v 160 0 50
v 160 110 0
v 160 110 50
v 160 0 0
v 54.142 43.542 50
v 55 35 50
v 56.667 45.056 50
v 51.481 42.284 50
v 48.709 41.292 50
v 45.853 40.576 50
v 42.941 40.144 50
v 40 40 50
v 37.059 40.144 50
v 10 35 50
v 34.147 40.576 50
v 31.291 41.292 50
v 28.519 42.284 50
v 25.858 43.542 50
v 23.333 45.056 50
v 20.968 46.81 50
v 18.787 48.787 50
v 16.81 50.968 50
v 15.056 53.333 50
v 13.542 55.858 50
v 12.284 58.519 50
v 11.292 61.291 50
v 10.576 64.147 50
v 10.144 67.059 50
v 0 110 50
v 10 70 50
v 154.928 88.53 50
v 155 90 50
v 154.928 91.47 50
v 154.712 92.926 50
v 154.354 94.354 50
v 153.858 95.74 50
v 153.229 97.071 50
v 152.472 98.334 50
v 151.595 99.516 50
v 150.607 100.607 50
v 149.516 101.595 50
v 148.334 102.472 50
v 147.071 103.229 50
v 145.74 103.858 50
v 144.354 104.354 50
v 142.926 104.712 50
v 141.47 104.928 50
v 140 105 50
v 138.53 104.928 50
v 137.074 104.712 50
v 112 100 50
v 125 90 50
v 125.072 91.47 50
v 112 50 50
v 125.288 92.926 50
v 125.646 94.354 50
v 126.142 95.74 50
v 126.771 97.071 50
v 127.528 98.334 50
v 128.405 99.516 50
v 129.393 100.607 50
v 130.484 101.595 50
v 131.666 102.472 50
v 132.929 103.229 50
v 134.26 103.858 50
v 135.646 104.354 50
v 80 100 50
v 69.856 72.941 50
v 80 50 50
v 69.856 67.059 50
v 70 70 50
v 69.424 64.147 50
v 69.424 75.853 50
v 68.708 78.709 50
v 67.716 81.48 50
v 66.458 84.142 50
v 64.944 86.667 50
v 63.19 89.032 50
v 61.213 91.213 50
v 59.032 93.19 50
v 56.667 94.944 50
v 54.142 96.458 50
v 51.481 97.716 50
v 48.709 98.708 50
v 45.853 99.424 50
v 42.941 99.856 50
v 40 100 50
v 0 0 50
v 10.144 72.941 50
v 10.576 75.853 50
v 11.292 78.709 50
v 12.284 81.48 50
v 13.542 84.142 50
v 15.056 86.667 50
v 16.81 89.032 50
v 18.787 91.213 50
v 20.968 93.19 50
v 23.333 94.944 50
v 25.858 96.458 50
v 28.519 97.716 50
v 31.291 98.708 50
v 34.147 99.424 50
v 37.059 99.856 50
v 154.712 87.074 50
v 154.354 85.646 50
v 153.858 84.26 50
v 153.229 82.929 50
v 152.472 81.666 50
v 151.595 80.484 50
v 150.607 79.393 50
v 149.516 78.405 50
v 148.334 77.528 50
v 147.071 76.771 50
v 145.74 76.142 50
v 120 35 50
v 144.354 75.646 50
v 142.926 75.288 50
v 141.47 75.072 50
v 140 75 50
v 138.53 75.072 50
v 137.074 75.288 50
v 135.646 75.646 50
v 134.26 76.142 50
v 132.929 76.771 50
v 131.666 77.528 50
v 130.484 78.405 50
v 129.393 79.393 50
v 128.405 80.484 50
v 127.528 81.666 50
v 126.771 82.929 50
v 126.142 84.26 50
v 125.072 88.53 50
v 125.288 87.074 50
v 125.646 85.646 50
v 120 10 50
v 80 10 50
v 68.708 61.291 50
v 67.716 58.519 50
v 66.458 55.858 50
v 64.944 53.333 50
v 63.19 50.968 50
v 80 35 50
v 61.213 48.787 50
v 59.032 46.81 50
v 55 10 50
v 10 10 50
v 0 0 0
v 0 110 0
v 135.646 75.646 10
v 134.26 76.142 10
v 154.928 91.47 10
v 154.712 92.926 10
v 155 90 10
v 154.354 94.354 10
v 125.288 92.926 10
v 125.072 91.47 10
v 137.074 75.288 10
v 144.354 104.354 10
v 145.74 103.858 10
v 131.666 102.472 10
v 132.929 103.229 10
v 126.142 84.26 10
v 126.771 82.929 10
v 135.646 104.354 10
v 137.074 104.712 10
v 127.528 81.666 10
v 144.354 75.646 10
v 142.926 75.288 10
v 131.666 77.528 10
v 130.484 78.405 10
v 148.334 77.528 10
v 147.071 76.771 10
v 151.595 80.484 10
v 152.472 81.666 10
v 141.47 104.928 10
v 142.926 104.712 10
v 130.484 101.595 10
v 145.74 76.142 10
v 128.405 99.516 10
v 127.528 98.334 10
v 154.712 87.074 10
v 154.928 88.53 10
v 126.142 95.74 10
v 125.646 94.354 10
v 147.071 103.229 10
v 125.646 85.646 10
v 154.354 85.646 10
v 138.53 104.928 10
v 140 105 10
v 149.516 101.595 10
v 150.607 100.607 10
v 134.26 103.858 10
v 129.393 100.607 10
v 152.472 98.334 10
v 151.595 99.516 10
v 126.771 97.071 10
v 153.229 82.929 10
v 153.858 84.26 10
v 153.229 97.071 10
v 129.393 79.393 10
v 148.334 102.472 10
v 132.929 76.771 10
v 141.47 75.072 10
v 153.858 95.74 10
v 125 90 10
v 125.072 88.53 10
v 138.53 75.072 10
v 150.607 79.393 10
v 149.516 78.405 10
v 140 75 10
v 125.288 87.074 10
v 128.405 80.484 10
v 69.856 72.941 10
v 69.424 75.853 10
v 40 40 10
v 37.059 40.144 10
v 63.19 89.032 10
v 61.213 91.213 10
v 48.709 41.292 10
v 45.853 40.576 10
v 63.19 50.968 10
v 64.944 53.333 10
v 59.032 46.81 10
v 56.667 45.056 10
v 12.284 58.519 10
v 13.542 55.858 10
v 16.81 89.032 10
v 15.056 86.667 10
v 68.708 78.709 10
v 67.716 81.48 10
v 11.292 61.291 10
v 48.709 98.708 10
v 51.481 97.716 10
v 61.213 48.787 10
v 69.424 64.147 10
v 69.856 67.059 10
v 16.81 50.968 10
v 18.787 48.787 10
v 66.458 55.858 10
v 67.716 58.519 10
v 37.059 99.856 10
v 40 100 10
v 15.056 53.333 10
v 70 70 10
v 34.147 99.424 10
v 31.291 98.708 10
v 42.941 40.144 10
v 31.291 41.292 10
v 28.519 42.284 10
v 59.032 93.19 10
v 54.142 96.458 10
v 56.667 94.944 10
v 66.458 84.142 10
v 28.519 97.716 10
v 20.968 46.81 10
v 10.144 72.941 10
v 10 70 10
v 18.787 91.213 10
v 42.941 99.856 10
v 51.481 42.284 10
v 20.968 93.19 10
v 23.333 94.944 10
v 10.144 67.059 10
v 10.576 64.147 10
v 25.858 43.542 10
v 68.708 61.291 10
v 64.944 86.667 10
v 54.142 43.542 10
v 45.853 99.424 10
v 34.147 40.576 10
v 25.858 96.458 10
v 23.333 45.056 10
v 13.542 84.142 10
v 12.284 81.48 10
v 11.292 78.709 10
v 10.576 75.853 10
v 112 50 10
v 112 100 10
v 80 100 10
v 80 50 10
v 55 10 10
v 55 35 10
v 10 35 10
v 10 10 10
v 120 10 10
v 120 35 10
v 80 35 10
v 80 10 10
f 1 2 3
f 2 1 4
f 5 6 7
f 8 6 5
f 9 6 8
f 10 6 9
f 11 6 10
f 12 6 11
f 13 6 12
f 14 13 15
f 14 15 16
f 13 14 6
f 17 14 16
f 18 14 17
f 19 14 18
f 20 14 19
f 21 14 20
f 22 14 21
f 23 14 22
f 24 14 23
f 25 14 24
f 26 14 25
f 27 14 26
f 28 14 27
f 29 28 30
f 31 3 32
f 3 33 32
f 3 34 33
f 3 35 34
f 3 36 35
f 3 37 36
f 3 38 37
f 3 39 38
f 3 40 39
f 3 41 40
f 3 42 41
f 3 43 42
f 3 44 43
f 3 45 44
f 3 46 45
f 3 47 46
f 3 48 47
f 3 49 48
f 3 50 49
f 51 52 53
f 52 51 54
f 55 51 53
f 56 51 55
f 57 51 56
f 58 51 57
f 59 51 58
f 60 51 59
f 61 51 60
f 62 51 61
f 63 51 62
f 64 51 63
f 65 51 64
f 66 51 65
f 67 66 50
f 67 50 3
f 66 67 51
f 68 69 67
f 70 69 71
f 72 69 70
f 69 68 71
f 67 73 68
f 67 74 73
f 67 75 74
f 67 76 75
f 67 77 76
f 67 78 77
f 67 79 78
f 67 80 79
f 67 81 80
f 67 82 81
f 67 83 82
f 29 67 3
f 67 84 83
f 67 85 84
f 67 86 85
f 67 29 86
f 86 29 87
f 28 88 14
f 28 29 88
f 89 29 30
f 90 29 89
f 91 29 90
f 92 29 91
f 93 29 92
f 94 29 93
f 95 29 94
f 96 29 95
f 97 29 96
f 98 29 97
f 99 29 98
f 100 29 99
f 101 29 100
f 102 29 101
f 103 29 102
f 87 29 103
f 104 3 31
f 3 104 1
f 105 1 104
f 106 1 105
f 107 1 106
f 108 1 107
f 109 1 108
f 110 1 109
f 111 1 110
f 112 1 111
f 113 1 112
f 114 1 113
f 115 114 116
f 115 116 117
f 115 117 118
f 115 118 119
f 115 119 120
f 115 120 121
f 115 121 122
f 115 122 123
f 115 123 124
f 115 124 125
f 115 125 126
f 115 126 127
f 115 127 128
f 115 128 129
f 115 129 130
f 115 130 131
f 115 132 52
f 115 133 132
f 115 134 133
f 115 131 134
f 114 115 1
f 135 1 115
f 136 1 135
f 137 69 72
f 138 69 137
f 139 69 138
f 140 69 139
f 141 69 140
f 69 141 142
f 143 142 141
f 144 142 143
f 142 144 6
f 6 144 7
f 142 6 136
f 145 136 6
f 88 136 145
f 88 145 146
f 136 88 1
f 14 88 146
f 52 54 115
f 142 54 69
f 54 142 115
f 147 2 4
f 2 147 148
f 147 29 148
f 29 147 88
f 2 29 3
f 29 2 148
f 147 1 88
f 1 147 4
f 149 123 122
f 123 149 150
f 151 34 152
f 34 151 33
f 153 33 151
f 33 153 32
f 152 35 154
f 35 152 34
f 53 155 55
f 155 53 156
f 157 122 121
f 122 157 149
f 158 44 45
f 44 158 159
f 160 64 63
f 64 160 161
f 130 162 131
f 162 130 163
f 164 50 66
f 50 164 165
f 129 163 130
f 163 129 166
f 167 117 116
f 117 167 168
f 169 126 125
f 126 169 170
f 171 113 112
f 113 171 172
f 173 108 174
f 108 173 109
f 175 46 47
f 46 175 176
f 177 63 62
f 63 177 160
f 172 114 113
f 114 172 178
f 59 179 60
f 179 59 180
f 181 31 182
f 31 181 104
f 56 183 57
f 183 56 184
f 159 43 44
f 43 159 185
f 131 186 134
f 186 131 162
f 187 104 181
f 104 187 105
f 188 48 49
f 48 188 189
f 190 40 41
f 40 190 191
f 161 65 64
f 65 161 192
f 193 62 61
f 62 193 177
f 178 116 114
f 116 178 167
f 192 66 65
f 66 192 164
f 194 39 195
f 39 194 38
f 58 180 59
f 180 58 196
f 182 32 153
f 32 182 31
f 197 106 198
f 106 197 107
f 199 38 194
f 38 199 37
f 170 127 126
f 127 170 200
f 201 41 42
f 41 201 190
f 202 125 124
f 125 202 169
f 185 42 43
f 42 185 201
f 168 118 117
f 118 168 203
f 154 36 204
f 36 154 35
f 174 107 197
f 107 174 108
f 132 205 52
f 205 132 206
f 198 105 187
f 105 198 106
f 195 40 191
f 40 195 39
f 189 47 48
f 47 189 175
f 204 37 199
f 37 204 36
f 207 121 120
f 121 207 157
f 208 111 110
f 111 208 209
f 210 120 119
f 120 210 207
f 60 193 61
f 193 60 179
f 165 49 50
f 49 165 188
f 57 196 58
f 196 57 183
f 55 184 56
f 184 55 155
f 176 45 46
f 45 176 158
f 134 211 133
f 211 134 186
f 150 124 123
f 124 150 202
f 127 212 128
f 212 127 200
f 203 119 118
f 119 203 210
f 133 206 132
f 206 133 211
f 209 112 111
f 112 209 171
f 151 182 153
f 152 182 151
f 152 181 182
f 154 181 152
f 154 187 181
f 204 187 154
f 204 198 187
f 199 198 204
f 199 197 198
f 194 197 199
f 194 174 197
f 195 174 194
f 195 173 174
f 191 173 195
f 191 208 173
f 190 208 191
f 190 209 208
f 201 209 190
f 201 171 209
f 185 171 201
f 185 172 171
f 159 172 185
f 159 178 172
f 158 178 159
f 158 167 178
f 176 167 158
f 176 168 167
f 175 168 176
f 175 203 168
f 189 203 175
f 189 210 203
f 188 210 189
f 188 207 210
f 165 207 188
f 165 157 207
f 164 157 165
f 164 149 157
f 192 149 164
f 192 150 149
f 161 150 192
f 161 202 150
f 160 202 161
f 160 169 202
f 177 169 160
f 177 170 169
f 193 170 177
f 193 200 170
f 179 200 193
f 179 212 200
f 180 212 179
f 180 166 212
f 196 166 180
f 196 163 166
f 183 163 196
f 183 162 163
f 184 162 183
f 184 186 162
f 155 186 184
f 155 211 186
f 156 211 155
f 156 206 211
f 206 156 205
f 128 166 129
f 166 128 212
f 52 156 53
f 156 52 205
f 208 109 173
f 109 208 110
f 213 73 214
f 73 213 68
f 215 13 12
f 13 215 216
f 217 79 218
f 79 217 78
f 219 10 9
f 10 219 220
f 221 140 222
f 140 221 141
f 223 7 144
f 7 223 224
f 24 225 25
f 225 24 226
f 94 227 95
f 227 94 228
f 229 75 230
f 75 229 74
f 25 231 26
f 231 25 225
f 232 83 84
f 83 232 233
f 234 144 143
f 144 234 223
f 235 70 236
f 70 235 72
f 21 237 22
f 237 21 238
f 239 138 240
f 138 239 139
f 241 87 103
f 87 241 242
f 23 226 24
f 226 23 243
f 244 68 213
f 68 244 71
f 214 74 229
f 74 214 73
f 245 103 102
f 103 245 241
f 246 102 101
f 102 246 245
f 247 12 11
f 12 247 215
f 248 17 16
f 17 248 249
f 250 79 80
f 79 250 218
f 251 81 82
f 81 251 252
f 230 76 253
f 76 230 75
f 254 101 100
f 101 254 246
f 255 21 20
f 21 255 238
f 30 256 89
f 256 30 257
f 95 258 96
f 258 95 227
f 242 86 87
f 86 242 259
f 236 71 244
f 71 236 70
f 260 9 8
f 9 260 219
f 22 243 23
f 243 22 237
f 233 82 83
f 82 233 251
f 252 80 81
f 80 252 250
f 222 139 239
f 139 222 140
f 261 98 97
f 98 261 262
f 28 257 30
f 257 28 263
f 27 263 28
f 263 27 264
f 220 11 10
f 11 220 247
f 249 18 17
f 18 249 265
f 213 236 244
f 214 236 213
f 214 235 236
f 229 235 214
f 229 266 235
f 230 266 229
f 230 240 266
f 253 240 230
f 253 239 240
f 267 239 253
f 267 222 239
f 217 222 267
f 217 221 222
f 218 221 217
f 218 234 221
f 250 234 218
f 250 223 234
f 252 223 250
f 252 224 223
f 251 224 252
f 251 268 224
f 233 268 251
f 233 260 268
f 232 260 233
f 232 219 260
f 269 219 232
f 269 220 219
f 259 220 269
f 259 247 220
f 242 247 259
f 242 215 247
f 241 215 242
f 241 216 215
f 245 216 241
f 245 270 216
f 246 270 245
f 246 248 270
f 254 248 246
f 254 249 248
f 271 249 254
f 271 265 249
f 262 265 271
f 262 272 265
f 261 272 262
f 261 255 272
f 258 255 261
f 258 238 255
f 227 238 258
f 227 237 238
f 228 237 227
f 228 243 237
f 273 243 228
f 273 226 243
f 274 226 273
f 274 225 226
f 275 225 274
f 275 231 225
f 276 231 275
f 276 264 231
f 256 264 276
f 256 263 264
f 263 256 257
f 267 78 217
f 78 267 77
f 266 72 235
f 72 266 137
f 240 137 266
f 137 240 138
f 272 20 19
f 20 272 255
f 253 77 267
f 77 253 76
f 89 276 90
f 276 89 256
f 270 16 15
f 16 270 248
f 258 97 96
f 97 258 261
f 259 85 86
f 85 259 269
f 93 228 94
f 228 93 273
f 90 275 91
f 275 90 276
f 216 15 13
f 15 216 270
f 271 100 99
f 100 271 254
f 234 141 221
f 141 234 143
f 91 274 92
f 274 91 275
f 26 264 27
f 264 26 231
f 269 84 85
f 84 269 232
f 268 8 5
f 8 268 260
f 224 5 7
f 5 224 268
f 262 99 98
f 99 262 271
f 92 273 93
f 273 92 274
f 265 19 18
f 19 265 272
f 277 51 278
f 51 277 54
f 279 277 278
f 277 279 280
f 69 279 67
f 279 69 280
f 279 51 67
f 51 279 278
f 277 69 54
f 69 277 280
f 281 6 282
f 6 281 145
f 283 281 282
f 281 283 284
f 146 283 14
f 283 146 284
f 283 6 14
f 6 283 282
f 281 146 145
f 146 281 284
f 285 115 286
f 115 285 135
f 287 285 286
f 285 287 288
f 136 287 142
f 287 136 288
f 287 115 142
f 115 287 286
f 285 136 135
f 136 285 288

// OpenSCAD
// desk orgenizer
// version 1
// 26.07.2025 Sebastian Weigl
 
// set the fregment sizes
$fn = $preview ? 48 : 64;

difference() {
// main body
cube([160,110,50]);
// small flashlight
translate([140,90,10])
#cylinder(h=80,d=30,center=false);
// big flashlight
translate([40,70,10])
#cylinder(h=80,d=60,center=false);
// flask
translate([80,50,10])
#cube([32,50,65]);
// remote bluray
translate([10,10,10])
#cube([45,25,80]);
// remote tv
translate([80,10,10])
#cube([40,25,80]);
}
